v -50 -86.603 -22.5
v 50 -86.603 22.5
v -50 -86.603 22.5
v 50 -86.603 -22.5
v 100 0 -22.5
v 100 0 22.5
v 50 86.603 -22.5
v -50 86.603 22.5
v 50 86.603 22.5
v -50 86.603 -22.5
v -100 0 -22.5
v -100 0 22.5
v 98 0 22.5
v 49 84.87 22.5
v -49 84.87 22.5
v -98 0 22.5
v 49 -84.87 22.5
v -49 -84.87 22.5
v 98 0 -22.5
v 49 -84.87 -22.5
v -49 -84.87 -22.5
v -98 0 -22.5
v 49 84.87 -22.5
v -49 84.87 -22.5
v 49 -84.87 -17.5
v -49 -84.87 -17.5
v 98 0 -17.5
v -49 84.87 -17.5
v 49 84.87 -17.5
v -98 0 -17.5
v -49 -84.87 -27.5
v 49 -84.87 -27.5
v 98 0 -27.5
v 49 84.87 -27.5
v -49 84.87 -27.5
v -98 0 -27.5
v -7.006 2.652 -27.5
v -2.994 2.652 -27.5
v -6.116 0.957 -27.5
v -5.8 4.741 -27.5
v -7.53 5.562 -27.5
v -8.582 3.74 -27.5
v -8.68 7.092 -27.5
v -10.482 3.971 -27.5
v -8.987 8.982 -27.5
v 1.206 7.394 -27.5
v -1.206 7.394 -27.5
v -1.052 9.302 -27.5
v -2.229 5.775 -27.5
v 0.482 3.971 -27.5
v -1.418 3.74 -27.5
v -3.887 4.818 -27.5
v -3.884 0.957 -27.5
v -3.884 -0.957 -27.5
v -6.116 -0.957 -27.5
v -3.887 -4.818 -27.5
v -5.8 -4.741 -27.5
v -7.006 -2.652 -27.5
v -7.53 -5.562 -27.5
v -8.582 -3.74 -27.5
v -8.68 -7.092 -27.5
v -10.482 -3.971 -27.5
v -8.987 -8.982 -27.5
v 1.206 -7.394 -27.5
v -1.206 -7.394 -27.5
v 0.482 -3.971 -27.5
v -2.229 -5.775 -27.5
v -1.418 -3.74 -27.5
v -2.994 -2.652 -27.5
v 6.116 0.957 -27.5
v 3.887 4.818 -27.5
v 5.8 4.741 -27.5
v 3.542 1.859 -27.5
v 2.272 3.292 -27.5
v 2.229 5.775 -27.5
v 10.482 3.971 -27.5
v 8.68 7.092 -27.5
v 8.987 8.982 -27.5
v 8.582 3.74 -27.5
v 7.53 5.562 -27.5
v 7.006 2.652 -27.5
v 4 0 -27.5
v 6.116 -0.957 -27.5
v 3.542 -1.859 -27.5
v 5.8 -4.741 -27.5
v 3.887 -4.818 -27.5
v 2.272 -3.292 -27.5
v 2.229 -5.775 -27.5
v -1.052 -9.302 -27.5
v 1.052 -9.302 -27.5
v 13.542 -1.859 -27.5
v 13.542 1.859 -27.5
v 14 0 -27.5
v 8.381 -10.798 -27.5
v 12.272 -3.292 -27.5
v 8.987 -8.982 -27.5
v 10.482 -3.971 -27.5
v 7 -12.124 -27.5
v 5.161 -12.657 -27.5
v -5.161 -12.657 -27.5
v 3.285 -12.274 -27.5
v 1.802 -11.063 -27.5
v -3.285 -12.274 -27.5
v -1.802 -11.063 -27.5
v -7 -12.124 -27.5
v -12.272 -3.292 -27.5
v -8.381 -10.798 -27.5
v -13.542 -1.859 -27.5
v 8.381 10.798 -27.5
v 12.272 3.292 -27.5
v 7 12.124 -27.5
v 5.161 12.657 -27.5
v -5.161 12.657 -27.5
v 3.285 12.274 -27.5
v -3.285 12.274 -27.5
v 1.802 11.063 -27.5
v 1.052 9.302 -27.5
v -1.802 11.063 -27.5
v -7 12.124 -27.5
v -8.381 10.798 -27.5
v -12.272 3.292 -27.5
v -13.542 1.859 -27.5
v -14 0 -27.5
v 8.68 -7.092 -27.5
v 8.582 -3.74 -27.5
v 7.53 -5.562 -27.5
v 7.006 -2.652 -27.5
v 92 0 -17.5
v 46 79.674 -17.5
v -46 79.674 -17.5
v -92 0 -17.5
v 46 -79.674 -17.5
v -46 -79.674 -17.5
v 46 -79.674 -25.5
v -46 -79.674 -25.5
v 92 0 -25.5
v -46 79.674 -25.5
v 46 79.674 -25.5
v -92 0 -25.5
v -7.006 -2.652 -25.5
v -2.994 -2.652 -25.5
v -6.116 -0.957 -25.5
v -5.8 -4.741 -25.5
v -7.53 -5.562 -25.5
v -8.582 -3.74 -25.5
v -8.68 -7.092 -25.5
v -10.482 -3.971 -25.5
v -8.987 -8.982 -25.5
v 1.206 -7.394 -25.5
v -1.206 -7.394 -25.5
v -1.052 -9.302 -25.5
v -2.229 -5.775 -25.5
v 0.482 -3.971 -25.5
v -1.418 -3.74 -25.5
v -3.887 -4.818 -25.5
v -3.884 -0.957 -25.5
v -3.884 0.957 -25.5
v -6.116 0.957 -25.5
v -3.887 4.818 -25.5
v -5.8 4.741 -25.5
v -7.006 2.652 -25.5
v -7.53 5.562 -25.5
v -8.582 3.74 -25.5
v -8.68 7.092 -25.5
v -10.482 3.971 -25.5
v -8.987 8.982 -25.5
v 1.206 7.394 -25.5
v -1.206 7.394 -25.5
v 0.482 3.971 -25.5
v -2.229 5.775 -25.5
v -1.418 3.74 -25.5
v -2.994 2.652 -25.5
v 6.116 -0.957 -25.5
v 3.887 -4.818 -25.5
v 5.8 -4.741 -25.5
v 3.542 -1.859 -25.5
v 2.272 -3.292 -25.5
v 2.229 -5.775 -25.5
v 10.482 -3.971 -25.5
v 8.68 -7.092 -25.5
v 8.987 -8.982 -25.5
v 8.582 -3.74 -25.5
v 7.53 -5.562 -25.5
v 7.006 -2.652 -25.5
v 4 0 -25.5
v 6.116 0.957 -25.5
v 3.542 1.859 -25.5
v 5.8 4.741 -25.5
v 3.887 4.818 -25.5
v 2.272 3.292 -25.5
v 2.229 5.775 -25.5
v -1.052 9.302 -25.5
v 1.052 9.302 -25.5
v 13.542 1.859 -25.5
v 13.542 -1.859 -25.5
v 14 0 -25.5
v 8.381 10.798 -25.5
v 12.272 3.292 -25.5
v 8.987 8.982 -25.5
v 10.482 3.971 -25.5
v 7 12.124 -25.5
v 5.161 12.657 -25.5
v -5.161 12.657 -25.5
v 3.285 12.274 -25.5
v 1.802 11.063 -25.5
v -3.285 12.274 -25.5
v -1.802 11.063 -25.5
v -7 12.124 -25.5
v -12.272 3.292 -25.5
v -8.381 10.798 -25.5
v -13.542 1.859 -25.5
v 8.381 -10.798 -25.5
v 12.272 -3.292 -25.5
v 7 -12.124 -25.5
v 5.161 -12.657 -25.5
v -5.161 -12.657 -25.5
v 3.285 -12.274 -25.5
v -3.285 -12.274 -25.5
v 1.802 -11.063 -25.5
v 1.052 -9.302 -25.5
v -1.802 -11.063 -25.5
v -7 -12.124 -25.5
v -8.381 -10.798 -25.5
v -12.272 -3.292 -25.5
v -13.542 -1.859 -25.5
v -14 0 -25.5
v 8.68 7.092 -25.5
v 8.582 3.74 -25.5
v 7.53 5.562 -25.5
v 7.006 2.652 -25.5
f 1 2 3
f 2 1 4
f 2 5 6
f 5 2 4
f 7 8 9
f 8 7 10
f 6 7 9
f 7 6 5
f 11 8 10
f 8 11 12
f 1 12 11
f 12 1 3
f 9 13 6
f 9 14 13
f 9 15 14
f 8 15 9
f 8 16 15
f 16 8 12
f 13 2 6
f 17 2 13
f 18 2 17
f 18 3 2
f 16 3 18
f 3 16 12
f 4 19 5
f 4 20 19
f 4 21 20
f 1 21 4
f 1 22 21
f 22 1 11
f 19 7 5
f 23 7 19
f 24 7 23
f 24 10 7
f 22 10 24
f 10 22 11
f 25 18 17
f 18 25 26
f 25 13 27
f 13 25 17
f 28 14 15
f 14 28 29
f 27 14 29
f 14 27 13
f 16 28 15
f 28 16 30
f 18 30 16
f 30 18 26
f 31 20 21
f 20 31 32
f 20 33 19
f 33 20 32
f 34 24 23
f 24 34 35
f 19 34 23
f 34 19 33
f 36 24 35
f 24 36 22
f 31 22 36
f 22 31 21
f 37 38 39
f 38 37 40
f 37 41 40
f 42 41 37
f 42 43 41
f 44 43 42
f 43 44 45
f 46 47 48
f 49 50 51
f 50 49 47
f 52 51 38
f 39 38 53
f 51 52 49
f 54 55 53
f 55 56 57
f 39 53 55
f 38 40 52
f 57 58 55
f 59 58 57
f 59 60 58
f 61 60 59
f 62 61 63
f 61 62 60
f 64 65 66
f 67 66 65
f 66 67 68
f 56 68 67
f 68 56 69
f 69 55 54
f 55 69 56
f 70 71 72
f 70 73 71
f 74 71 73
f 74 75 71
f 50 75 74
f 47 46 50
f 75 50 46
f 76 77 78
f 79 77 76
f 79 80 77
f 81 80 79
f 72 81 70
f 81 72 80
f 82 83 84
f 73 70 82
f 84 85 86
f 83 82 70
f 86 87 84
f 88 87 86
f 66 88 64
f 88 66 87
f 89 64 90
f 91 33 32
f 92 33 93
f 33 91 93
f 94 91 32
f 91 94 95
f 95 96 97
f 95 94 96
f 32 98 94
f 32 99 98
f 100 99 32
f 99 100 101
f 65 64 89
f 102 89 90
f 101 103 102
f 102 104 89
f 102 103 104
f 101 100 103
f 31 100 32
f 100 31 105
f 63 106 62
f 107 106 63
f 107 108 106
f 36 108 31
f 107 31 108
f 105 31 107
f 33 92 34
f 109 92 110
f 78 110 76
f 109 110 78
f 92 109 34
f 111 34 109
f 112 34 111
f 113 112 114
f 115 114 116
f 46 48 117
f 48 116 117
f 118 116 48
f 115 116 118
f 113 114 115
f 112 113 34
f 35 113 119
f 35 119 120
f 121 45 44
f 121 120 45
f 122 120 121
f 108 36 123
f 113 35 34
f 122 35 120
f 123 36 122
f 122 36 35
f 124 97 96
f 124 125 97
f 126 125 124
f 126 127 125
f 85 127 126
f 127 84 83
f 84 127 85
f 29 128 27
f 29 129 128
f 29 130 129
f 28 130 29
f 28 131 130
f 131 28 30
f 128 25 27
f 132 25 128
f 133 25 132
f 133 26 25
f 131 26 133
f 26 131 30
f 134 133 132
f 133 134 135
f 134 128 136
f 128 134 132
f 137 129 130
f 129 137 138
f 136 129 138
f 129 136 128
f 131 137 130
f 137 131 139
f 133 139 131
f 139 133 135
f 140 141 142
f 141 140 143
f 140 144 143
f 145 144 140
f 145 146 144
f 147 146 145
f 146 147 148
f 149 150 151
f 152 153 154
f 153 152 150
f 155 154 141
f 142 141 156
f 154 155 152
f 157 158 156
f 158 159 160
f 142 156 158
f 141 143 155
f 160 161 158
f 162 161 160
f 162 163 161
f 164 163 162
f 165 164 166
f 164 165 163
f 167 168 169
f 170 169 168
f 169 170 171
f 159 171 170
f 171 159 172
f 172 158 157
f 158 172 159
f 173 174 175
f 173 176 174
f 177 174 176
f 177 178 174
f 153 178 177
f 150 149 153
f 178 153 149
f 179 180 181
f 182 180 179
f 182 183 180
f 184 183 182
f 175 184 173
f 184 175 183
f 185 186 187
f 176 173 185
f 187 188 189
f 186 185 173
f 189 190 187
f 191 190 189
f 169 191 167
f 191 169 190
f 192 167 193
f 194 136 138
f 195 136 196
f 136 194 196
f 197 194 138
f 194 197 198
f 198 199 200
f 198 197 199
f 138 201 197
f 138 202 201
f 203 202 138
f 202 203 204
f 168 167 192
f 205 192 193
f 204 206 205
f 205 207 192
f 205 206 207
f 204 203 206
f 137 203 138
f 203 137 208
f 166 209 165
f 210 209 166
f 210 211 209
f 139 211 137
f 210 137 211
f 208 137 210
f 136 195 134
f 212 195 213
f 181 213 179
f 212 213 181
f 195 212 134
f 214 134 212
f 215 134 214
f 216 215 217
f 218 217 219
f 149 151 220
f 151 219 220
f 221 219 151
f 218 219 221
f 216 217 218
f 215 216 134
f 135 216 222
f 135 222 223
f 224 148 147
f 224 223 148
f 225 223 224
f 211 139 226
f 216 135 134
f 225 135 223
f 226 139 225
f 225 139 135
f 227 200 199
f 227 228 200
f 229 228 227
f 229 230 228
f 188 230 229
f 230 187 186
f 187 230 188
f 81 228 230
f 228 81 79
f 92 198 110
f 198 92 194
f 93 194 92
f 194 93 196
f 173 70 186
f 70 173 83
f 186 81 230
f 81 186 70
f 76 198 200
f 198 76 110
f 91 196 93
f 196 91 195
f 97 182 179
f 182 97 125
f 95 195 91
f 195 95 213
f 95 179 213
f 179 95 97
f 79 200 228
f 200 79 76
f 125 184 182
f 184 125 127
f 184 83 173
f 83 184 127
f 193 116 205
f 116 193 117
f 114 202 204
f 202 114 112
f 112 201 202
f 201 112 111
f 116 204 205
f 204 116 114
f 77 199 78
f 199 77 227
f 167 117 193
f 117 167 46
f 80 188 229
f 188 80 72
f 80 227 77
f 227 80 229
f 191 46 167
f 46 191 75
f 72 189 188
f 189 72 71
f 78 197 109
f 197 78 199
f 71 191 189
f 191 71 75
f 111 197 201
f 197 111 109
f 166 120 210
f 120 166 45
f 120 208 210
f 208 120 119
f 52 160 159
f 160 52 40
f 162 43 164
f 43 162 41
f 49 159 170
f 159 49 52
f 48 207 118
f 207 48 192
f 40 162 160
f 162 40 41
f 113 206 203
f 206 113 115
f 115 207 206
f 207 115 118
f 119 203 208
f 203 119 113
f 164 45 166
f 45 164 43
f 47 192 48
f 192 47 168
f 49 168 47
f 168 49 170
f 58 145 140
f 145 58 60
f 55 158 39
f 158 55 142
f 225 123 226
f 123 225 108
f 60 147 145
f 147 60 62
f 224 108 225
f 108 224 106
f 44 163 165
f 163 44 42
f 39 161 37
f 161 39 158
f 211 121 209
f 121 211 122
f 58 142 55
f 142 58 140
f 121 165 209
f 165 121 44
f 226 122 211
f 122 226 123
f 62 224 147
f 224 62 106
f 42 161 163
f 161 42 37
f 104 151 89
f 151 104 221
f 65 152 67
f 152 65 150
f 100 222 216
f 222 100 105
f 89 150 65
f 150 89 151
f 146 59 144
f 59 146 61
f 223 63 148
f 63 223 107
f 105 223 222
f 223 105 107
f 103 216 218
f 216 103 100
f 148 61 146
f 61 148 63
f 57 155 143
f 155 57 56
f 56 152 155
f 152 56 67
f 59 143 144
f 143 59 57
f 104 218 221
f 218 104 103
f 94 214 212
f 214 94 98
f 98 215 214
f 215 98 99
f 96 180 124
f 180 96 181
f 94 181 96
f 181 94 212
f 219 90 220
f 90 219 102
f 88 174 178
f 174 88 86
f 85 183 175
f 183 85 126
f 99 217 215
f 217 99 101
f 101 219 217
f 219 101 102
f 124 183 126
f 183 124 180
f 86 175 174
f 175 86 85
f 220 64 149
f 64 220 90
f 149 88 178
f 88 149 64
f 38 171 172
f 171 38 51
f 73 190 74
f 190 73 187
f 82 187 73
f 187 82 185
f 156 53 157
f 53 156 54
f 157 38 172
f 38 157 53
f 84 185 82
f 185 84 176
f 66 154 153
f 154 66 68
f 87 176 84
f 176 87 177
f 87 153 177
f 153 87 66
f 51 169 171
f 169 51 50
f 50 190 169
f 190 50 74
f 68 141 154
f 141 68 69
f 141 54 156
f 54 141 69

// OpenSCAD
// file: parameters.scad
$radius = 100;
$height = 50;

$margin = 2;

$connection = 5;

$hole_dia = 4;
// main file
include <parameters.scad>

module planter() {
  union() {
    difference() {
      difference() {
        union() {
          // Top part of planter
          color("lime") difference() {
            cylinder(h = $height - $connection, r = $radius, $fn = 6,
                     center = true);

            // DIFF
            translate([ 0, 0, $margin ]) cylinder(
                h = $height, r = $radius - $margin, center = true, $fn = 6);
          }

          // Bottom connector
          color("tomato") translate([ 0, 0, -($height / 2) ]) {
            union() {
              // Connector part
              cylinder(h = $connection, r = $radius - $margin, $fn = 6,
                       center = true);

              // Connecting bit to outer shell
              translate([ 0, 0, $connection ]) cylinder(
                  h = $connection, r = $radius - .1, $fn = 6, center = true);
            }
          }
        }
        // DIFF
        translate([ 0, 0, -$height / 2 + $margin * 2 ])
            cylinder(h = $connection + $margin * 2, r = $radius - $margin * 4,
                     $fn = 6, center = true);
      }

      // Drainage holes
      translate([ 0, 0, -$height ]) cylinder($height, $hole_dia, $hole_dia);
      for (i = [0:5]) {
        rotate([ 0, 0, 360 / 6 * i ])
            translate([ $hole_dia * 2 + $margin, 0, -$height ])
                cylinder($height, $hole_dia, $hole_dia);
      }
    }
  }
}
planter();
